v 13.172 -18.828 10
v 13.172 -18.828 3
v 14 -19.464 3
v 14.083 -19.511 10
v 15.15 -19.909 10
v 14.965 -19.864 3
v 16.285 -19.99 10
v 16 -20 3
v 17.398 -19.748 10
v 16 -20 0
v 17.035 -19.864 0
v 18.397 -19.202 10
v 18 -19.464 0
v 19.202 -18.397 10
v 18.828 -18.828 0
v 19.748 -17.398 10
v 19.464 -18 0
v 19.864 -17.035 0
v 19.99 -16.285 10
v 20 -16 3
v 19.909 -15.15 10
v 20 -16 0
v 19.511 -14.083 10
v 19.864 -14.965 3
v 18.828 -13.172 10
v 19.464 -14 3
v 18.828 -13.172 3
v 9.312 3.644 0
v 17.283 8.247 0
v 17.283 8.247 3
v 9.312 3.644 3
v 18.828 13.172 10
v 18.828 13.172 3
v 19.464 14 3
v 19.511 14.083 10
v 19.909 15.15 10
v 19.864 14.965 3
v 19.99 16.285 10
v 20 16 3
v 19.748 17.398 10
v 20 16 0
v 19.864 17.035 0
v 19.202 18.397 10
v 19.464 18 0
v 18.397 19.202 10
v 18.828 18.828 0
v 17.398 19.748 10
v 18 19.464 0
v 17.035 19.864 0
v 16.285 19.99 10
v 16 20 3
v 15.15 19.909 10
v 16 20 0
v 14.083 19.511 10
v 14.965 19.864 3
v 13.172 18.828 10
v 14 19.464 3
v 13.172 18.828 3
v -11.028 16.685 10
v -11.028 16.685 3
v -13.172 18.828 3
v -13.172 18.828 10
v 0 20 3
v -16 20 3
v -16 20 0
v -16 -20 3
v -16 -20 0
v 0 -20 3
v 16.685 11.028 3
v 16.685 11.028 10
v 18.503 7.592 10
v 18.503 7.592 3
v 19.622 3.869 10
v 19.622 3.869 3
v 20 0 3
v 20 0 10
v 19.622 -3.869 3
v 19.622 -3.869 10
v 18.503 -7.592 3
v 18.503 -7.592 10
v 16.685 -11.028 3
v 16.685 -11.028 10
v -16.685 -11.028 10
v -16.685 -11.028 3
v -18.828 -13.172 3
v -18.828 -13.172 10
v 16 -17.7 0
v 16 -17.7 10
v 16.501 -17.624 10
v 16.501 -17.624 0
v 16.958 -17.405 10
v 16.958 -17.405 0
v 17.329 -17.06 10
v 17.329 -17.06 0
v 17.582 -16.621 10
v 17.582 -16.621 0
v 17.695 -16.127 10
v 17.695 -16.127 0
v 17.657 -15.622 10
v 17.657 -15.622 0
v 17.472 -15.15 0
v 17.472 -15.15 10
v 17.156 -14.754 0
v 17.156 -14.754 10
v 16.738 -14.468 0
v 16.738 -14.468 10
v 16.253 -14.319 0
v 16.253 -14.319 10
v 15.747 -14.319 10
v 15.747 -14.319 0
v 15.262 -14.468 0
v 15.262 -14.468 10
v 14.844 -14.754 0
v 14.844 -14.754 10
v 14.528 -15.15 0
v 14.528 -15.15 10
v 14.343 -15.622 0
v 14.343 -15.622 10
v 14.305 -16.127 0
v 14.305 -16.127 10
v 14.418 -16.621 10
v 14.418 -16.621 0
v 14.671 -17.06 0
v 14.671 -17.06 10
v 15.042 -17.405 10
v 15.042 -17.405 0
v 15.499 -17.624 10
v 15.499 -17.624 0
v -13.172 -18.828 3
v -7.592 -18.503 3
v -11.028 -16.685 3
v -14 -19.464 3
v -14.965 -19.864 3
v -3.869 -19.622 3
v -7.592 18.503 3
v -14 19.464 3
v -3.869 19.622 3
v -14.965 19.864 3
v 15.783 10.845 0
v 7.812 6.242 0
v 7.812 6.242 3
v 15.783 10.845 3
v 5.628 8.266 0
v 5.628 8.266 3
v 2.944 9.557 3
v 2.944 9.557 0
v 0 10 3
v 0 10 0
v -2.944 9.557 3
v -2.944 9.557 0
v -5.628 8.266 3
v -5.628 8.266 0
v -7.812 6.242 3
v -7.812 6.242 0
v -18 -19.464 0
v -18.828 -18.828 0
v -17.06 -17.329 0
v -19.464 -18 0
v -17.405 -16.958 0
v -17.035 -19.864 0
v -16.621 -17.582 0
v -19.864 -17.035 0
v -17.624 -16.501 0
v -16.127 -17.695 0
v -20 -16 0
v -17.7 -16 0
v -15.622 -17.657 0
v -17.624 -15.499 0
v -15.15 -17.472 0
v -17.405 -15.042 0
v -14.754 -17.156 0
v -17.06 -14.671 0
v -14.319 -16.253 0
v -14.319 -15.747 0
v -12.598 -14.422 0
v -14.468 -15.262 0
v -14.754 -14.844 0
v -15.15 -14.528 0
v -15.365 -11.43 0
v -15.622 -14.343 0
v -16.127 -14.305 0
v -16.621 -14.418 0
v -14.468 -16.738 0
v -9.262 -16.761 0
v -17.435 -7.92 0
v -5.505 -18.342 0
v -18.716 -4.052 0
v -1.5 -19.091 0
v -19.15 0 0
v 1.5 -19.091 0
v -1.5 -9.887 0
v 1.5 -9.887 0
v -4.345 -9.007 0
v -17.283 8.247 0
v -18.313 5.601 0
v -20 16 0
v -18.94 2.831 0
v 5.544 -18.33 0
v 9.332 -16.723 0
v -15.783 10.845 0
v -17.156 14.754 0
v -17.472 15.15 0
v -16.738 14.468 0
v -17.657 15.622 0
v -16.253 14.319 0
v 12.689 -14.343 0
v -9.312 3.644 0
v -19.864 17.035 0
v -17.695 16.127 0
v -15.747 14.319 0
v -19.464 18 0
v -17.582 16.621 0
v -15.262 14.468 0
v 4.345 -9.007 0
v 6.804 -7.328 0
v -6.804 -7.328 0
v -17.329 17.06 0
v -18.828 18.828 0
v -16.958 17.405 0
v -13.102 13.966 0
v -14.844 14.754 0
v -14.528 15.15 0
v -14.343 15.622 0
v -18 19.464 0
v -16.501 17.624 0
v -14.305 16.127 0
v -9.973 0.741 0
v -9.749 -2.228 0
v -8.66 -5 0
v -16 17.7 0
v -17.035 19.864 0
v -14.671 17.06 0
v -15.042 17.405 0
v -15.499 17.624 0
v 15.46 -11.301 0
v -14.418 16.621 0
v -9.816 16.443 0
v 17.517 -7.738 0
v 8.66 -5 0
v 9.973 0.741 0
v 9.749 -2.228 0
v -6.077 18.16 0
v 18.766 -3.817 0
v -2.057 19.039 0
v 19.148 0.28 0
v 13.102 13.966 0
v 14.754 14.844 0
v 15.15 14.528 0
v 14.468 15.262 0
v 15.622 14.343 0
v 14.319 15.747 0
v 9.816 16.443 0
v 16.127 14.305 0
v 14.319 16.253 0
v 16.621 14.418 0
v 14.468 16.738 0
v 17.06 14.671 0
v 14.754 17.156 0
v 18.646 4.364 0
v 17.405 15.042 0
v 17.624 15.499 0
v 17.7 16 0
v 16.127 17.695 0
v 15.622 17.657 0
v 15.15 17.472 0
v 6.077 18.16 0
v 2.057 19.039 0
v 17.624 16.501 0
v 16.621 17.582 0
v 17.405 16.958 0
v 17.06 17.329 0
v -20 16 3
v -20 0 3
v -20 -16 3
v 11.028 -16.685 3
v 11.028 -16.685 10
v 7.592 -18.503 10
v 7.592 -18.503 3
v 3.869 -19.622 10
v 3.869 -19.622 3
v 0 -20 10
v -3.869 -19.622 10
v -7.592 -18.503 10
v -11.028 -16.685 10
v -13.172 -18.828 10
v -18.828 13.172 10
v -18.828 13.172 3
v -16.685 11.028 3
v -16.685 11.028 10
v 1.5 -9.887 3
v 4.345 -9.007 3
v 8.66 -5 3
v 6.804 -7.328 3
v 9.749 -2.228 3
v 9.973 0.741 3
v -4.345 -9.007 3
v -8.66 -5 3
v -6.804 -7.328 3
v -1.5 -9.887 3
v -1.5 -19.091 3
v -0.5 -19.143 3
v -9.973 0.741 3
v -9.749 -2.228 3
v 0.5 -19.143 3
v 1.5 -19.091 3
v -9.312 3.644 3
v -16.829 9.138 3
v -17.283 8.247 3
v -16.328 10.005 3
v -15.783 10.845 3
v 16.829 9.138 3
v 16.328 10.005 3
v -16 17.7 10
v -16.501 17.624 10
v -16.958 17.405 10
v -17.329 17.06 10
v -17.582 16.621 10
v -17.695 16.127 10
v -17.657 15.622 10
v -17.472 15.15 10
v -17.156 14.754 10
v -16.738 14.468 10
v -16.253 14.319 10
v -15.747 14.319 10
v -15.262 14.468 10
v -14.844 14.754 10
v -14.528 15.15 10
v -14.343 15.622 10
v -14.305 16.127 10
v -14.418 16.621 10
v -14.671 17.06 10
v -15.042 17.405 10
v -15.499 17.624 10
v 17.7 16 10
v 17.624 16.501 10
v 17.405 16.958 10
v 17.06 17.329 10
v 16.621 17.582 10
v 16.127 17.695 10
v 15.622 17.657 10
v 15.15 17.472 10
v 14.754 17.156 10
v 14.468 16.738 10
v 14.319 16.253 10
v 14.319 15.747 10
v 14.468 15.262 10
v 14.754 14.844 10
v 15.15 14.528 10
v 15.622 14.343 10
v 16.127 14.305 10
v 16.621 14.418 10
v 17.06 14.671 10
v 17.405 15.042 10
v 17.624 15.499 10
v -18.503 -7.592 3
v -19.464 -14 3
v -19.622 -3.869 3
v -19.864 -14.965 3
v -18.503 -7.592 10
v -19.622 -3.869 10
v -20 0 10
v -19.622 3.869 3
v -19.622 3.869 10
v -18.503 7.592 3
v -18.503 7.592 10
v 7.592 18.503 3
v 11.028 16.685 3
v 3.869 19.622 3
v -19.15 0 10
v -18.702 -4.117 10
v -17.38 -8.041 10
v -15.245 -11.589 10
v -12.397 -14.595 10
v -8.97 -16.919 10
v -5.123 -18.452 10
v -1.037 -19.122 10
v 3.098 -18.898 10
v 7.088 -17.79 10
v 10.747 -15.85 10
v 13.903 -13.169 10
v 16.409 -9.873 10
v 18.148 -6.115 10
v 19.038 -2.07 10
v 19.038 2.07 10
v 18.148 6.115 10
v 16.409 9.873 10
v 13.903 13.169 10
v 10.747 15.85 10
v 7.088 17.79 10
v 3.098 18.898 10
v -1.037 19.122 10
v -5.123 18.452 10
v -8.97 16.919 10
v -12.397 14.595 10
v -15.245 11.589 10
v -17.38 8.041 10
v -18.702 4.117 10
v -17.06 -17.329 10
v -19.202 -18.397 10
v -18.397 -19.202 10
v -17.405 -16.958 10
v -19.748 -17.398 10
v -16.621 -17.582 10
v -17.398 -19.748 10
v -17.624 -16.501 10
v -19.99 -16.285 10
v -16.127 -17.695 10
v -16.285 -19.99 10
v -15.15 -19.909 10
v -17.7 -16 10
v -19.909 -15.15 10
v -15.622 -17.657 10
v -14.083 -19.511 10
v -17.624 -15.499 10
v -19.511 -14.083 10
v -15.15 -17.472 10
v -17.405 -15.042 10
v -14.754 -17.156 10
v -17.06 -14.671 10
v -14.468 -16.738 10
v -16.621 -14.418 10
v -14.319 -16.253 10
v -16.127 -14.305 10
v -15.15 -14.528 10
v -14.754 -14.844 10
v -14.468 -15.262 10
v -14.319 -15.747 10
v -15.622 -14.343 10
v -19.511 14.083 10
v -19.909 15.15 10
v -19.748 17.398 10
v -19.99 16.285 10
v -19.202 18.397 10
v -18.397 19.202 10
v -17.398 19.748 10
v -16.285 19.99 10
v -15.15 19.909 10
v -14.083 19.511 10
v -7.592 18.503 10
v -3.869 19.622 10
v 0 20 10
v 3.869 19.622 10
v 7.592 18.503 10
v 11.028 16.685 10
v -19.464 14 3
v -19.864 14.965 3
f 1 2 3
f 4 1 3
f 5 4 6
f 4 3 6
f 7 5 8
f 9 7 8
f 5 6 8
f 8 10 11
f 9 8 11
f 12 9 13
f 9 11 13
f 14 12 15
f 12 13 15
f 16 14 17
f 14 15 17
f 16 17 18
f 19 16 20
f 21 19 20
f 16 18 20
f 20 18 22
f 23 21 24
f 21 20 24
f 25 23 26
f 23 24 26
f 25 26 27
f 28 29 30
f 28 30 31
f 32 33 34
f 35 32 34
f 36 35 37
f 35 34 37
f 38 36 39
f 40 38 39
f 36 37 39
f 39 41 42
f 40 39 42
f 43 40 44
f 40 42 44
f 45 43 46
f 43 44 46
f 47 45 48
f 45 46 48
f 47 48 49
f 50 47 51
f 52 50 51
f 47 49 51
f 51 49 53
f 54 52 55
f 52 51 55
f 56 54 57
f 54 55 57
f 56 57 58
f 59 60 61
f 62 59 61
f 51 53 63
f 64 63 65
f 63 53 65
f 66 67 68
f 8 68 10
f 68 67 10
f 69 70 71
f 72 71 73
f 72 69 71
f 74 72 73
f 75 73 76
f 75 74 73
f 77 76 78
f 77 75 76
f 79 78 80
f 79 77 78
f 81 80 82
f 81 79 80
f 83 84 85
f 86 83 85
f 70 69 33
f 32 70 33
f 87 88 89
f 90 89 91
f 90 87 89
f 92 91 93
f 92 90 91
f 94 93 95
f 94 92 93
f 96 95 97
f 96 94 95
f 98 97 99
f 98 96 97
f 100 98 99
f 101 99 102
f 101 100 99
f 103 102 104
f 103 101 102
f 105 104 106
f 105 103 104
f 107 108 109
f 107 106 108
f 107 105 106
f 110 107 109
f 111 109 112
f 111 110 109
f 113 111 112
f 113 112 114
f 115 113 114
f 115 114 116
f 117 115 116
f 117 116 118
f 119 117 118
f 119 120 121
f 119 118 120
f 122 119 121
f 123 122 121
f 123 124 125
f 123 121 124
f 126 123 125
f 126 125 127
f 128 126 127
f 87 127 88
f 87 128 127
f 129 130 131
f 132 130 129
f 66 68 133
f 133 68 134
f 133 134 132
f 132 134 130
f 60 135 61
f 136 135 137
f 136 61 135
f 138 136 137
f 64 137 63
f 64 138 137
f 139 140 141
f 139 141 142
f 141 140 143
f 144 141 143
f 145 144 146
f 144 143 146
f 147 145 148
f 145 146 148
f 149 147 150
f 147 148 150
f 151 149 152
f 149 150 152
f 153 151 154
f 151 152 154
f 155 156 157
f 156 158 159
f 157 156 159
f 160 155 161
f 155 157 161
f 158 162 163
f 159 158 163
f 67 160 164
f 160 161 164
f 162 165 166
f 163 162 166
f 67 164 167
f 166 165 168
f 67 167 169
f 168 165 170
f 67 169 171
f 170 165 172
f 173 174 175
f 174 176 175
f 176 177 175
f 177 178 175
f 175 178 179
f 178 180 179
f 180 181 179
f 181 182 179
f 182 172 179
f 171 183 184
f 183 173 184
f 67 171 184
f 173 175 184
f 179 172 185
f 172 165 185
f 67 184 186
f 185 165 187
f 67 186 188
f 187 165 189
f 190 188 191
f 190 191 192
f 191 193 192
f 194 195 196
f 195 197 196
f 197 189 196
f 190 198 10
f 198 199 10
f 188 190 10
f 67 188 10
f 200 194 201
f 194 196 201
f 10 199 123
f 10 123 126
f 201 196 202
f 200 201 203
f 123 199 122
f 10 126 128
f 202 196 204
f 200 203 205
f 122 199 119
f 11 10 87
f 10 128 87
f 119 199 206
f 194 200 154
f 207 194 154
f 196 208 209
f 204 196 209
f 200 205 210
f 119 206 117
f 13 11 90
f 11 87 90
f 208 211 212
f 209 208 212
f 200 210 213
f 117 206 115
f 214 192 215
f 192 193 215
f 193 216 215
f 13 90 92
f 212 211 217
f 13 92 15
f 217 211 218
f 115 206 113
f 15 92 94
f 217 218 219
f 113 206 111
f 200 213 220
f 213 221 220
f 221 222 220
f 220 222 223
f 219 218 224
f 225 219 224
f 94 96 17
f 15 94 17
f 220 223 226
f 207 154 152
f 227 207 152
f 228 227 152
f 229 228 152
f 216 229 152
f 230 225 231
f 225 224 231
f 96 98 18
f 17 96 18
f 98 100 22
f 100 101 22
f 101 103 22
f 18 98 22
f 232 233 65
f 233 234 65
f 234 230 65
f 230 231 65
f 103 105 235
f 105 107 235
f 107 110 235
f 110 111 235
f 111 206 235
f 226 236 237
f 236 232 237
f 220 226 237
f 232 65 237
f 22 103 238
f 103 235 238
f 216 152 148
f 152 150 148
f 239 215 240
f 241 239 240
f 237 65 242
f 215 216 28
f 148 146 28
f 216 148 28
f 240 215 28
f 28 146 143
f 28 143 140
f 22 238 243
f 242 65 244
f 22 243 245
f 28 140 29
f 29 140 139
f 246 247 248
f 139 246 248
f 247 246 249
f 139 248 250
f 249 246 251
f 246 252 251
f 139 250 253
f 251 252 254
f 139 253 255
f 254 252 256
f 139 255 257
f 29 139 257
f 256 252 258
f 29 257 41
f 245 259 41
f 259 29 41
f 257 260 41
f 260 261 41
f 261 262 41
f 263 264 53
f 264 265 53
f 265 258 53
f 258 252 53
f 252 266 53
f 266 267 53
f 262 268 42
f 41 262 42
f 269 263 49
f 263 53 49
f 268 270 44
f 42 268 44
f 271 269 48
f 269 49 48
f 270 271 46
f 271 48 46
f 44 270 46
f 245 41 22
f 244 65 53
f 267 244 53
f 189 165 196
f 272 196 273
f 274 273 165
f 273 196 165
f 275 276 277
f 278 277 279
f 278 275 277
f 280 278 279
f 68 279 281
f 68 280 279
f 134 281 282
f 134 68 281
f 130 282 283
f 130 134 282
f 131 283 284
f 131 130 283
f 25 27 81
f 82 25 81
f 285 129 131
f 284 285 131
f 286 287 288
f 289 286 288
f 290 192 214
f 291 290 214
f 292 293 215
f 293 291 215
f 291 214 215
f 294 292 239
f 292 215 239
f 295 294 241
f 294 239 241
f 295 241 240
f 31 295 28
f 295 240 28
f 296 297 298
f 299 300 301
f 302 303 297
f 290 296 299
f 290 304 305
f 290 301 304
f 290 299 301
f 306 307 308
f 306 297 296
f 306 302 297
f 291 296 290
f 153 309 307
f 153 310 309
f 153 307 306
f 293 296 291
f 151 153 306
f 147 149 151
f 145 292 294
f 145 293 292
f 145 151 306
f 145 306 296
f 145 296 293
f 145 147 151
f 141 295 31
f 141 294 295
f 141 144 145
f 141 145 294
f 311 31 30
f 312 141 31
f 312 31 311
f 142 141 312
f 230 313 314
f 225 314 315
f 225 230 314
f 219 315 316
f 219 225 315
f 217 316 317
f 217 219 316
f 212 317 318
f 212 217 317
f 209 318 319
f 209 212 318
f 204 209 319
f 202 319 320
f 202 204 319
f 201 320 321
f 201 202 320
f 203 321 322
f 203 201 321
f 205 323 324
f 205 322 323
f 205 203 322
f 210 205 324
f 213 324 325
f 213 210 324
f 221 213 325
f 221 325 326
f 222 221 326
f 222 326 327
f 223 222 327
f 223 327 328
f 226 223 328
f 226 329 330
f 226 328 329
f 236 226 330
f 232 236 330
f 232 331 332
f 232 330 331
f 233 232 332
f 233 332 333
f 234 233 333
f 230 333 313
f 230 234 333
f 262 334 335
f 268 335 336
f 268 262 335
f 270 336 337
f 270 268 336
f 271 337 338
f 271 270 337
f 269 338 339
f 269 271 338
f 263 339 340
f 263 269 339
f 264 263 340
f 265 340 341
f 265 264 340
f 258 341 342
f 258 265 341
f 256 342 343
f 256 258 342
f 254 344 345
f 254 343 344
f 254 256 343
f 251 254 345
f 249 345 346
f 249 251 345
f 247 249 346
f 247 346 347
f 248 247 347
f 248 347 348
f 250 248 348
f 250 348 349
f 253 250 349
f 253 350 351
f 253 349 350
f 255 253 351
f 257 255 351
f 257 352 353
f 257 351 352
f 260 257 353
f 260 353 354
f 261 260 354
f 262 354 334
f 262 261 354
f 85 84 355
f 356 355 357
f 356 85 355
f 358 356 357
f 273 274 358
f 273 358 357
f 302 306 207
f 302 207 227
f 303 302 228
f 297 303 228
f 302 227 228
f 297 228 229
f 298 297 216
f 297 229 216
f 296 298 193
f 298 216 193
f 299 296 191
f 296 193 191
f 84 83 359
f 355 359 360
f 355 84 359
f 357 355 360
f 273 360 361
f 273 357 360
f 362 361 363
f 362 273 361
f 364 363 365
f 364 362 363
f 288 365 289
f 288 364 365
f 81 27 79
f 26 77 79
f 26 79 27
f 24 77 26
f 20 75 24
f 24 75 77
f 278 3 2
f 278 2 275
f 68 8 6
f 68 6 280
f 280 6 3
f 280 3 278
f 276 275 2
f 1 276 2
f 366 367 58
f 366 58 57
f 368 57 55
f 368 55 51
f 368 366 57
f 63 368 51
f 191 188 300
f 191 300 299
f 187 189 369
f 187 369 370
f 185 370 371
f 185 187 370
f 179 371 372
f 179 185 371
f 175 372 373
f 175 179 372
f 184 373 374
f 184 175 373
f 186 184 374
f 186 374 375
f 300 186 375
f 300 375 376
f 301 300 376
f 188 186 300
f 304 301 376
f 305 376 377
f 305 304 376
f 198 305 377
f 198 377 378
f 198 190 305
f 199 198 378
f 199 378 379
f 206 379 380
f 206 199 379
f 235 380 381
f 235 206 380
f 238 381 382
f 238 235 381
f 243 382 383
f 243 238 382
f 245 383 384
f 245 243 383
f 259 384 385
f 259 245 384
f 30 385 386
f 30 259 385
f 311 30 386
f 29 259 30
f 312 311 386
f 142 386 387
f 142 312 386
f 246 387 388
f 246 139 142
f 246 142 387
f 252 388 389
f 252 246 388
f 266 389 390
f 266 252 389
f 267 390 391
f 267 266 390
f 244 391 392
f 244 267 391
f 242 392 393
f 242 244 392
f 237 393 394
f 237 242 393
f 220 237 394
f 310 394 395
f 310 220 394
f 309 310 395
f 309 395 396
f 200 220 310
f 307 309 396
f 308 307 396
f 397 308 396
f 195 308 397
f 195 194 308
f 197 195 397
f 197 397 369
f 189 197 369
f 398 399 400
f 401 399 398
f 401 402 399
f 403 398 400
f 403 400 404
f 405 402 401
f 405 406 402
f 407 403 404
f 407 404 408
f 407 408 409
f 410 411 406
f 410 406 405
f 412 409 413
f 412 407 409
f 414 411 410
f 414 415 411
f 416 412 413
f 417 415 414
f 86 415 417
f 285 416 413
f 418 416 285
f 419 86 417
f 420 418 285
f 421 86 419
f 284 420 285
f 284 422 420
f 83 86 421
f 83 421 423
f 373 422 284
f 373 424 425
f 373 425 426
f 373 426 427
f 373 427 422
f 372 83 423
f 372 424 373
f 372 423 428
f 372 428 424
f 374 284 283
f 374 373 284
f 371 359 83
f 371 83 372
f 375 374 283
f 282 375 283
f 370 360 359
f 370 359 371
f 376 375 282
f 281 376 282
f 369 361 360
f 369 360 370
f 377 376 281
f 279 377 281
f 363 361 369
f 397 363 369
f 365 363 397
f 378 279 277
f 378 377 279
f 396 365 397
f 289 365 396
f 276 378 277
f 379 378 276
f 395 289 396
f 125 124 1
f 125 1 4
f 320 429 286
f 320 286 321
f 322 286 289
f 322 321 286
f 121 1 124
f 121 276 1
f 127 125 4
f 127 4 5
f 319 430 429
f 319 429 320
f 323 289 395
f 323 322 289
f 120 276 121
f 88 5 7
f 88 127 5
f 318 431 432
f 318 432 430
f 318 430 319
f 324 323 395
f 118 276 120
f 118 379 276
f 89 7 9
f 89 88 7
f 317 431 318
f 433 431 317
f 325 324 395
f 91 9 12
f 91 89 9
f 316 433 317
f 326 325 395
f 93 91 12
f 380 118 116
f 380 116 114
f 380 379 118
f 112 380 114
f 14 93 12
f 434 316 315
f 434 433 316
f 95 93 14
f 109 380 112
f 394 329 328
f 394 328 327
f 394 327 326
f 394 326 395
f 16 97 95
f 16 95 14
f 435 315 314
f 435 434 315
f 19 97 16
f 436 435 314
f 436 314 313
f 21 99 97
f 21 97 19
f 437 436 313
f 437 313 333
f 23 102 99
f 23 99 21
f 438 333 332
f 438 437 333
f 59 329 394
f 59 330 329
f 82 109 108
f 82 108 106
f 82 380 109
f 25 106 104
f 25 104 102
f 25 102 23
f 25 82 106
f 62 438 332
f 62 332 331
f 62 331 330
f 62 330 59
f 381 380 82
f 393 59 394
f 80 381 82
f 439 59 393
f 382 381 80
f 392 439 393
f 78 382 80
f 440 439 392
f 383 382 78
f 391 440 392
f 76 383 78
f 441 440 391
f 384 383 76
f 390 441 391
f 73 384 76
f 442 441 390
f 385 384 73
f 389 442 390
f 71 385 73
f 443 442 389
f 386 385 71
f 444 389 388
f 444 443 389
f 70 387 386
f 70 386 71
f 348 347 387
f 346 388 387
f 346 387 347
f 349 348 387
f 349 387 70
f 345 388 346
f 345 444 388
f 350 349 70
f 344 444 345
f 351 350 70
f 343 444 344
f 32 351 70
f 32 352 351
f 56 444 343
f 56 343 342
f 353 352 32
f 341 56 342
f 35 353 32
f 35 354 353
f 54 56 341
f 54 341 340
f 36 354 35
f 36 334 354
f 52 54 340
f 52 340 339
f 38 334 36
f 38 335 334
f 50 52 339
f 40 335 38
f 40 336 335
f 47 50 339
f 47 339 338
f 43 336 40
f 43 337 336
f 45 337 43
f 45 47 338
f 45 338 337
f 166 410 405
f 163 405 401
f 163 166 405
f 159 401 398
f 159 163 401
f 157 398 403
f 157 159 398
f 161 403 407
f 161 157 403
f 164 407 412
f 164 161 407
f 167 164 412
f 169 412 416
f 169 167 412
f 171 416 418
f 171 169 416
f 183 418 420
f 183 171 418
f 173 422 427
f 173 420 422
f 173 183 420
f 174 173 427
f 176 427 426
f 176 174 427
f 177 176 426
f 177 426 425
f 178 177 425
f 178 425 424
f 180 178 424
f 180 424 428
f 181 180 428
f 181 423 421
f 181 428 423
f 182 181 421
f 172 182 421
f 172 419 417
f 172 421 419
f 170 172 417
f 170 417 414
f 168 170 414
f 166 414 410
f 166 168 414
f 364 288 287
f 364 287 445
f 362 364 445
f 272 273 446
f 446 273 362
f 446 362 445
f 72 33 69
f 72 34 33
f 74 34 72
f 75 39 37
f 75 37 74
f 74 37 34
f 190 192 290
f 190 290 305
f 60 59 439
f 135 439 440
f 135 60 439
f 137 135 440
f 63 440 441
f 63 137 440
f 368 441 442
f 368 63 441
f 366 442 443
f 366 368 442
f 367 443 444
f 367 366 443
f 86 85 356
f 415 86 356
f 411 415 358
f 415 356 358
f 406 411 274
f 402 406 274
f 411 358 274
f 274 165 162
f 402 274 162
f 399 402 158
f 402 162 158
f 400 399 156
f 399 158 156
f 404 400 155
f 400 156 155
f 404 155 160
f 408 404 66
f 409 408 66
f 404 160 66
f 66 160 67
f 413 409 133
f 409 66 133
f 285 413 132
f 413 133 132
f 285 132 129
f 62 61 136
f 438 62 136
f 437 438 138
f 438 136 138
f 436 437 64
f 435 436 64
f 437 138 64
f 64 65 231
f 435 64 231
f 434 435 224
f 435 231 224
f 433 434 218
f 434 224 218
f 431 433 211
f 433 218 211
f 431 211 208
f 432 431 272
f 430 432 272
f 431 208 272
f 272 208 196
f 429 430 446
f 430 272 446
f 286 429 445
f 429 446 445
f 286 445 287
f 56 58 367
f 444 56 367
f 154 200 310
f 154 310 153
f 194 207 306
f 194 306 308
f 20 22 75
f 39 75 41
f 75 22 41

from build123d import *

# Parameters (mm, degrees)
SKETCH_BODY_R                       = 19.15
BODY_DEPTH                          = 10
SKETCH_CUT_BODY_W                   = 7
SKETCH_CUT_BODY_H                   = 6.627416998
REINFORCMENT_STRIP_DEPTH            = 10
CIRPATTERN_REINFORCMENT_STRIP_COUNT = 4
SKETCH_FIXING_HOLE_R                = 1.7
FIXING_HOLE_DEPTH                   = 31
CIRPATTERN_FIXING_HOLE_COUNT        = 4
BONE_DEPTH                          = 3
CIRPATTERN_BONE_COUNT               = 3
SKETCH_FIXING_PLATE_FAN_R           = 10
FIXING_PLATE_FAN_DEPTH              = 3


with BuildPart() as part:
    # Sketch-Body → Body (new body)
    with BuildSketch(Plane.XY):
        with BuildLine():
            Line((-16, -20), (16, -20))
            ThreePointArc((16, -20), (18.828427125, -18.828427125), (20, -16))
            Line((20, -16), (20, 16))
            ThreePointArc((20, 16), (18.828427125, 18.828427125), (16, 20))
            Line((16, 20), (-16, 20))
            ThreePointArc((-16, 20), (-18.828427125, 18.828427125), (-20, 16))
            Line((-20, 16), (-20, -16))
            ThreePointArc((-20, -16), (-18.828427125, -18.828427125), (-16, -20))
        make_face()
        with Locations(Location((0, 0, 0), (0, 0, 180))):
            Circle(SKETCH_BODY_R, mode=Mode.SUBTRACT)
    extrude(amount=BODY_DEPTH)

    # Sketch-Cut-Body → Cut-Body (revolve, cut)
    with BuildSketch(Plane(origin=(0, 0, 0), x_dir=(0, 0, -1), z_dir=(1, 0, 0)), mode=Mode.PRIVATE) as cut_body_sk:
        with Locations((-6.5, 23.313708499)):
            Rectangle(SKETCH_CUT_BODY_W, SKETCH_CUT_BODY_H)
    revolve(cut_body_sk.sketch.rotate(Axis((0, 0, 10), (0, 0, -1)), 90), axis=Axis((0, 0, 10), (0, 0, -1)), mode=Mode.SUBTRACT)

    # Sketch-Reinforcment-Strip → Reinforcment-Strip (add)
    with BuildSketch(Plane.XY):
        with BuildLine():
            Line((16.684833585, 11.027979336), (18.828427125, 13.171572875))
            ThreePointArc((18.828427125, 13.171572875), (18.828427125, 18.828427125), (13.171572875, 18.828427125))
            Line((13.171572875, 18.828427125), (11.027979336, 16.684833585))
            ThreePointArc((11.027979336, 16.684833585), (14.142135624, 14.142135624), (16.684833585, 11.027979336))
        make_face()
    reinforcment_strip = extrude(amount=REINFORCMENT_STRIP_DEPTH)

    # CirPattern-Reinforcment-Strip: Reinforcment-Strip ×4 about axis
    cirpattern_reinforcment_strip_axis = Axis((0, 0, 0), (0, 0, 1))
    for i in range(1, CIRPATTERN_REINFORCMENT_STRIP_COUNT):
        add(reinforcment_strip.rotate(cirpattern_reinforcment_strip_axis, i * 360 / CIRPATTERN_REINFORCMENT_STRIP_COUNT))

    # Sketch-Fixing-Hole → Fixing-Hole (cut, through all)
    with BuildSketch(Plane.XY):
        with Locations((16, 16)):
            Circle(SKETCH_FIXING_HOLE_R)
    fixing_hole = extrude(amount=FIXING_HOLE_DEPTH, mode=Mode.SUBTRACT)

    # CirPattern-Fixing-Hole: Fixing-Hole ×4 about axis
    cirpattern_fixing_hole_axis = Axis((0, 0, 0), (0, 0, 1))
    for i in range(1, CIRPATTERN_FIXING_HOLE_COUNT):
        add(fixing_hole.rotate(cirpattern_fixing_hole_axis, i * 360 / CIRPATTERN_FIXING_HOLE_COUNT), mode=Mode.SUBTRACT)

    # Sketch-Bone → Bone (add)
    with BuildSketch(Plane.XY):
        with BuildLine():
            Line((1.5, -9.886859967), (1.5, -19.091162877))
            ThreePointArc((1.5, -19.091162877), (0, -19.15), (-1.5, -19.091162877))
            Line((-1.5, -19.091162877), (-1.5, -9.886859967))
            ThreePointArc((-1.5, -9.886859967), (0, -10), (1.5, -9.886859967))
        make_face()
    bone = extrude(amount=BONE_DEPTH)

    # CirPattern-Bone: Bone ×3 about axis
    cirpattern_bone_axis = Axis((0, 0, 0), (0, 0, 1))
    for i in range(1, CIRPATTERN_BONE_COUNT):
        add(bone.rotate(cirpattern_bone_axis, i * 360 / CIRPATTERN_BONE_COUNT))

    # Sketch-Fixing-Plate-Fan → Fixing-Plate-Fan (add)
    with BuildSketch(Plane.XY):
        Circle(SKETCH_FIXING_PLATE_FAN_R)
    extrude(amount=FIXING_PLATE_FAN_DEPTH)


solid = part.part
